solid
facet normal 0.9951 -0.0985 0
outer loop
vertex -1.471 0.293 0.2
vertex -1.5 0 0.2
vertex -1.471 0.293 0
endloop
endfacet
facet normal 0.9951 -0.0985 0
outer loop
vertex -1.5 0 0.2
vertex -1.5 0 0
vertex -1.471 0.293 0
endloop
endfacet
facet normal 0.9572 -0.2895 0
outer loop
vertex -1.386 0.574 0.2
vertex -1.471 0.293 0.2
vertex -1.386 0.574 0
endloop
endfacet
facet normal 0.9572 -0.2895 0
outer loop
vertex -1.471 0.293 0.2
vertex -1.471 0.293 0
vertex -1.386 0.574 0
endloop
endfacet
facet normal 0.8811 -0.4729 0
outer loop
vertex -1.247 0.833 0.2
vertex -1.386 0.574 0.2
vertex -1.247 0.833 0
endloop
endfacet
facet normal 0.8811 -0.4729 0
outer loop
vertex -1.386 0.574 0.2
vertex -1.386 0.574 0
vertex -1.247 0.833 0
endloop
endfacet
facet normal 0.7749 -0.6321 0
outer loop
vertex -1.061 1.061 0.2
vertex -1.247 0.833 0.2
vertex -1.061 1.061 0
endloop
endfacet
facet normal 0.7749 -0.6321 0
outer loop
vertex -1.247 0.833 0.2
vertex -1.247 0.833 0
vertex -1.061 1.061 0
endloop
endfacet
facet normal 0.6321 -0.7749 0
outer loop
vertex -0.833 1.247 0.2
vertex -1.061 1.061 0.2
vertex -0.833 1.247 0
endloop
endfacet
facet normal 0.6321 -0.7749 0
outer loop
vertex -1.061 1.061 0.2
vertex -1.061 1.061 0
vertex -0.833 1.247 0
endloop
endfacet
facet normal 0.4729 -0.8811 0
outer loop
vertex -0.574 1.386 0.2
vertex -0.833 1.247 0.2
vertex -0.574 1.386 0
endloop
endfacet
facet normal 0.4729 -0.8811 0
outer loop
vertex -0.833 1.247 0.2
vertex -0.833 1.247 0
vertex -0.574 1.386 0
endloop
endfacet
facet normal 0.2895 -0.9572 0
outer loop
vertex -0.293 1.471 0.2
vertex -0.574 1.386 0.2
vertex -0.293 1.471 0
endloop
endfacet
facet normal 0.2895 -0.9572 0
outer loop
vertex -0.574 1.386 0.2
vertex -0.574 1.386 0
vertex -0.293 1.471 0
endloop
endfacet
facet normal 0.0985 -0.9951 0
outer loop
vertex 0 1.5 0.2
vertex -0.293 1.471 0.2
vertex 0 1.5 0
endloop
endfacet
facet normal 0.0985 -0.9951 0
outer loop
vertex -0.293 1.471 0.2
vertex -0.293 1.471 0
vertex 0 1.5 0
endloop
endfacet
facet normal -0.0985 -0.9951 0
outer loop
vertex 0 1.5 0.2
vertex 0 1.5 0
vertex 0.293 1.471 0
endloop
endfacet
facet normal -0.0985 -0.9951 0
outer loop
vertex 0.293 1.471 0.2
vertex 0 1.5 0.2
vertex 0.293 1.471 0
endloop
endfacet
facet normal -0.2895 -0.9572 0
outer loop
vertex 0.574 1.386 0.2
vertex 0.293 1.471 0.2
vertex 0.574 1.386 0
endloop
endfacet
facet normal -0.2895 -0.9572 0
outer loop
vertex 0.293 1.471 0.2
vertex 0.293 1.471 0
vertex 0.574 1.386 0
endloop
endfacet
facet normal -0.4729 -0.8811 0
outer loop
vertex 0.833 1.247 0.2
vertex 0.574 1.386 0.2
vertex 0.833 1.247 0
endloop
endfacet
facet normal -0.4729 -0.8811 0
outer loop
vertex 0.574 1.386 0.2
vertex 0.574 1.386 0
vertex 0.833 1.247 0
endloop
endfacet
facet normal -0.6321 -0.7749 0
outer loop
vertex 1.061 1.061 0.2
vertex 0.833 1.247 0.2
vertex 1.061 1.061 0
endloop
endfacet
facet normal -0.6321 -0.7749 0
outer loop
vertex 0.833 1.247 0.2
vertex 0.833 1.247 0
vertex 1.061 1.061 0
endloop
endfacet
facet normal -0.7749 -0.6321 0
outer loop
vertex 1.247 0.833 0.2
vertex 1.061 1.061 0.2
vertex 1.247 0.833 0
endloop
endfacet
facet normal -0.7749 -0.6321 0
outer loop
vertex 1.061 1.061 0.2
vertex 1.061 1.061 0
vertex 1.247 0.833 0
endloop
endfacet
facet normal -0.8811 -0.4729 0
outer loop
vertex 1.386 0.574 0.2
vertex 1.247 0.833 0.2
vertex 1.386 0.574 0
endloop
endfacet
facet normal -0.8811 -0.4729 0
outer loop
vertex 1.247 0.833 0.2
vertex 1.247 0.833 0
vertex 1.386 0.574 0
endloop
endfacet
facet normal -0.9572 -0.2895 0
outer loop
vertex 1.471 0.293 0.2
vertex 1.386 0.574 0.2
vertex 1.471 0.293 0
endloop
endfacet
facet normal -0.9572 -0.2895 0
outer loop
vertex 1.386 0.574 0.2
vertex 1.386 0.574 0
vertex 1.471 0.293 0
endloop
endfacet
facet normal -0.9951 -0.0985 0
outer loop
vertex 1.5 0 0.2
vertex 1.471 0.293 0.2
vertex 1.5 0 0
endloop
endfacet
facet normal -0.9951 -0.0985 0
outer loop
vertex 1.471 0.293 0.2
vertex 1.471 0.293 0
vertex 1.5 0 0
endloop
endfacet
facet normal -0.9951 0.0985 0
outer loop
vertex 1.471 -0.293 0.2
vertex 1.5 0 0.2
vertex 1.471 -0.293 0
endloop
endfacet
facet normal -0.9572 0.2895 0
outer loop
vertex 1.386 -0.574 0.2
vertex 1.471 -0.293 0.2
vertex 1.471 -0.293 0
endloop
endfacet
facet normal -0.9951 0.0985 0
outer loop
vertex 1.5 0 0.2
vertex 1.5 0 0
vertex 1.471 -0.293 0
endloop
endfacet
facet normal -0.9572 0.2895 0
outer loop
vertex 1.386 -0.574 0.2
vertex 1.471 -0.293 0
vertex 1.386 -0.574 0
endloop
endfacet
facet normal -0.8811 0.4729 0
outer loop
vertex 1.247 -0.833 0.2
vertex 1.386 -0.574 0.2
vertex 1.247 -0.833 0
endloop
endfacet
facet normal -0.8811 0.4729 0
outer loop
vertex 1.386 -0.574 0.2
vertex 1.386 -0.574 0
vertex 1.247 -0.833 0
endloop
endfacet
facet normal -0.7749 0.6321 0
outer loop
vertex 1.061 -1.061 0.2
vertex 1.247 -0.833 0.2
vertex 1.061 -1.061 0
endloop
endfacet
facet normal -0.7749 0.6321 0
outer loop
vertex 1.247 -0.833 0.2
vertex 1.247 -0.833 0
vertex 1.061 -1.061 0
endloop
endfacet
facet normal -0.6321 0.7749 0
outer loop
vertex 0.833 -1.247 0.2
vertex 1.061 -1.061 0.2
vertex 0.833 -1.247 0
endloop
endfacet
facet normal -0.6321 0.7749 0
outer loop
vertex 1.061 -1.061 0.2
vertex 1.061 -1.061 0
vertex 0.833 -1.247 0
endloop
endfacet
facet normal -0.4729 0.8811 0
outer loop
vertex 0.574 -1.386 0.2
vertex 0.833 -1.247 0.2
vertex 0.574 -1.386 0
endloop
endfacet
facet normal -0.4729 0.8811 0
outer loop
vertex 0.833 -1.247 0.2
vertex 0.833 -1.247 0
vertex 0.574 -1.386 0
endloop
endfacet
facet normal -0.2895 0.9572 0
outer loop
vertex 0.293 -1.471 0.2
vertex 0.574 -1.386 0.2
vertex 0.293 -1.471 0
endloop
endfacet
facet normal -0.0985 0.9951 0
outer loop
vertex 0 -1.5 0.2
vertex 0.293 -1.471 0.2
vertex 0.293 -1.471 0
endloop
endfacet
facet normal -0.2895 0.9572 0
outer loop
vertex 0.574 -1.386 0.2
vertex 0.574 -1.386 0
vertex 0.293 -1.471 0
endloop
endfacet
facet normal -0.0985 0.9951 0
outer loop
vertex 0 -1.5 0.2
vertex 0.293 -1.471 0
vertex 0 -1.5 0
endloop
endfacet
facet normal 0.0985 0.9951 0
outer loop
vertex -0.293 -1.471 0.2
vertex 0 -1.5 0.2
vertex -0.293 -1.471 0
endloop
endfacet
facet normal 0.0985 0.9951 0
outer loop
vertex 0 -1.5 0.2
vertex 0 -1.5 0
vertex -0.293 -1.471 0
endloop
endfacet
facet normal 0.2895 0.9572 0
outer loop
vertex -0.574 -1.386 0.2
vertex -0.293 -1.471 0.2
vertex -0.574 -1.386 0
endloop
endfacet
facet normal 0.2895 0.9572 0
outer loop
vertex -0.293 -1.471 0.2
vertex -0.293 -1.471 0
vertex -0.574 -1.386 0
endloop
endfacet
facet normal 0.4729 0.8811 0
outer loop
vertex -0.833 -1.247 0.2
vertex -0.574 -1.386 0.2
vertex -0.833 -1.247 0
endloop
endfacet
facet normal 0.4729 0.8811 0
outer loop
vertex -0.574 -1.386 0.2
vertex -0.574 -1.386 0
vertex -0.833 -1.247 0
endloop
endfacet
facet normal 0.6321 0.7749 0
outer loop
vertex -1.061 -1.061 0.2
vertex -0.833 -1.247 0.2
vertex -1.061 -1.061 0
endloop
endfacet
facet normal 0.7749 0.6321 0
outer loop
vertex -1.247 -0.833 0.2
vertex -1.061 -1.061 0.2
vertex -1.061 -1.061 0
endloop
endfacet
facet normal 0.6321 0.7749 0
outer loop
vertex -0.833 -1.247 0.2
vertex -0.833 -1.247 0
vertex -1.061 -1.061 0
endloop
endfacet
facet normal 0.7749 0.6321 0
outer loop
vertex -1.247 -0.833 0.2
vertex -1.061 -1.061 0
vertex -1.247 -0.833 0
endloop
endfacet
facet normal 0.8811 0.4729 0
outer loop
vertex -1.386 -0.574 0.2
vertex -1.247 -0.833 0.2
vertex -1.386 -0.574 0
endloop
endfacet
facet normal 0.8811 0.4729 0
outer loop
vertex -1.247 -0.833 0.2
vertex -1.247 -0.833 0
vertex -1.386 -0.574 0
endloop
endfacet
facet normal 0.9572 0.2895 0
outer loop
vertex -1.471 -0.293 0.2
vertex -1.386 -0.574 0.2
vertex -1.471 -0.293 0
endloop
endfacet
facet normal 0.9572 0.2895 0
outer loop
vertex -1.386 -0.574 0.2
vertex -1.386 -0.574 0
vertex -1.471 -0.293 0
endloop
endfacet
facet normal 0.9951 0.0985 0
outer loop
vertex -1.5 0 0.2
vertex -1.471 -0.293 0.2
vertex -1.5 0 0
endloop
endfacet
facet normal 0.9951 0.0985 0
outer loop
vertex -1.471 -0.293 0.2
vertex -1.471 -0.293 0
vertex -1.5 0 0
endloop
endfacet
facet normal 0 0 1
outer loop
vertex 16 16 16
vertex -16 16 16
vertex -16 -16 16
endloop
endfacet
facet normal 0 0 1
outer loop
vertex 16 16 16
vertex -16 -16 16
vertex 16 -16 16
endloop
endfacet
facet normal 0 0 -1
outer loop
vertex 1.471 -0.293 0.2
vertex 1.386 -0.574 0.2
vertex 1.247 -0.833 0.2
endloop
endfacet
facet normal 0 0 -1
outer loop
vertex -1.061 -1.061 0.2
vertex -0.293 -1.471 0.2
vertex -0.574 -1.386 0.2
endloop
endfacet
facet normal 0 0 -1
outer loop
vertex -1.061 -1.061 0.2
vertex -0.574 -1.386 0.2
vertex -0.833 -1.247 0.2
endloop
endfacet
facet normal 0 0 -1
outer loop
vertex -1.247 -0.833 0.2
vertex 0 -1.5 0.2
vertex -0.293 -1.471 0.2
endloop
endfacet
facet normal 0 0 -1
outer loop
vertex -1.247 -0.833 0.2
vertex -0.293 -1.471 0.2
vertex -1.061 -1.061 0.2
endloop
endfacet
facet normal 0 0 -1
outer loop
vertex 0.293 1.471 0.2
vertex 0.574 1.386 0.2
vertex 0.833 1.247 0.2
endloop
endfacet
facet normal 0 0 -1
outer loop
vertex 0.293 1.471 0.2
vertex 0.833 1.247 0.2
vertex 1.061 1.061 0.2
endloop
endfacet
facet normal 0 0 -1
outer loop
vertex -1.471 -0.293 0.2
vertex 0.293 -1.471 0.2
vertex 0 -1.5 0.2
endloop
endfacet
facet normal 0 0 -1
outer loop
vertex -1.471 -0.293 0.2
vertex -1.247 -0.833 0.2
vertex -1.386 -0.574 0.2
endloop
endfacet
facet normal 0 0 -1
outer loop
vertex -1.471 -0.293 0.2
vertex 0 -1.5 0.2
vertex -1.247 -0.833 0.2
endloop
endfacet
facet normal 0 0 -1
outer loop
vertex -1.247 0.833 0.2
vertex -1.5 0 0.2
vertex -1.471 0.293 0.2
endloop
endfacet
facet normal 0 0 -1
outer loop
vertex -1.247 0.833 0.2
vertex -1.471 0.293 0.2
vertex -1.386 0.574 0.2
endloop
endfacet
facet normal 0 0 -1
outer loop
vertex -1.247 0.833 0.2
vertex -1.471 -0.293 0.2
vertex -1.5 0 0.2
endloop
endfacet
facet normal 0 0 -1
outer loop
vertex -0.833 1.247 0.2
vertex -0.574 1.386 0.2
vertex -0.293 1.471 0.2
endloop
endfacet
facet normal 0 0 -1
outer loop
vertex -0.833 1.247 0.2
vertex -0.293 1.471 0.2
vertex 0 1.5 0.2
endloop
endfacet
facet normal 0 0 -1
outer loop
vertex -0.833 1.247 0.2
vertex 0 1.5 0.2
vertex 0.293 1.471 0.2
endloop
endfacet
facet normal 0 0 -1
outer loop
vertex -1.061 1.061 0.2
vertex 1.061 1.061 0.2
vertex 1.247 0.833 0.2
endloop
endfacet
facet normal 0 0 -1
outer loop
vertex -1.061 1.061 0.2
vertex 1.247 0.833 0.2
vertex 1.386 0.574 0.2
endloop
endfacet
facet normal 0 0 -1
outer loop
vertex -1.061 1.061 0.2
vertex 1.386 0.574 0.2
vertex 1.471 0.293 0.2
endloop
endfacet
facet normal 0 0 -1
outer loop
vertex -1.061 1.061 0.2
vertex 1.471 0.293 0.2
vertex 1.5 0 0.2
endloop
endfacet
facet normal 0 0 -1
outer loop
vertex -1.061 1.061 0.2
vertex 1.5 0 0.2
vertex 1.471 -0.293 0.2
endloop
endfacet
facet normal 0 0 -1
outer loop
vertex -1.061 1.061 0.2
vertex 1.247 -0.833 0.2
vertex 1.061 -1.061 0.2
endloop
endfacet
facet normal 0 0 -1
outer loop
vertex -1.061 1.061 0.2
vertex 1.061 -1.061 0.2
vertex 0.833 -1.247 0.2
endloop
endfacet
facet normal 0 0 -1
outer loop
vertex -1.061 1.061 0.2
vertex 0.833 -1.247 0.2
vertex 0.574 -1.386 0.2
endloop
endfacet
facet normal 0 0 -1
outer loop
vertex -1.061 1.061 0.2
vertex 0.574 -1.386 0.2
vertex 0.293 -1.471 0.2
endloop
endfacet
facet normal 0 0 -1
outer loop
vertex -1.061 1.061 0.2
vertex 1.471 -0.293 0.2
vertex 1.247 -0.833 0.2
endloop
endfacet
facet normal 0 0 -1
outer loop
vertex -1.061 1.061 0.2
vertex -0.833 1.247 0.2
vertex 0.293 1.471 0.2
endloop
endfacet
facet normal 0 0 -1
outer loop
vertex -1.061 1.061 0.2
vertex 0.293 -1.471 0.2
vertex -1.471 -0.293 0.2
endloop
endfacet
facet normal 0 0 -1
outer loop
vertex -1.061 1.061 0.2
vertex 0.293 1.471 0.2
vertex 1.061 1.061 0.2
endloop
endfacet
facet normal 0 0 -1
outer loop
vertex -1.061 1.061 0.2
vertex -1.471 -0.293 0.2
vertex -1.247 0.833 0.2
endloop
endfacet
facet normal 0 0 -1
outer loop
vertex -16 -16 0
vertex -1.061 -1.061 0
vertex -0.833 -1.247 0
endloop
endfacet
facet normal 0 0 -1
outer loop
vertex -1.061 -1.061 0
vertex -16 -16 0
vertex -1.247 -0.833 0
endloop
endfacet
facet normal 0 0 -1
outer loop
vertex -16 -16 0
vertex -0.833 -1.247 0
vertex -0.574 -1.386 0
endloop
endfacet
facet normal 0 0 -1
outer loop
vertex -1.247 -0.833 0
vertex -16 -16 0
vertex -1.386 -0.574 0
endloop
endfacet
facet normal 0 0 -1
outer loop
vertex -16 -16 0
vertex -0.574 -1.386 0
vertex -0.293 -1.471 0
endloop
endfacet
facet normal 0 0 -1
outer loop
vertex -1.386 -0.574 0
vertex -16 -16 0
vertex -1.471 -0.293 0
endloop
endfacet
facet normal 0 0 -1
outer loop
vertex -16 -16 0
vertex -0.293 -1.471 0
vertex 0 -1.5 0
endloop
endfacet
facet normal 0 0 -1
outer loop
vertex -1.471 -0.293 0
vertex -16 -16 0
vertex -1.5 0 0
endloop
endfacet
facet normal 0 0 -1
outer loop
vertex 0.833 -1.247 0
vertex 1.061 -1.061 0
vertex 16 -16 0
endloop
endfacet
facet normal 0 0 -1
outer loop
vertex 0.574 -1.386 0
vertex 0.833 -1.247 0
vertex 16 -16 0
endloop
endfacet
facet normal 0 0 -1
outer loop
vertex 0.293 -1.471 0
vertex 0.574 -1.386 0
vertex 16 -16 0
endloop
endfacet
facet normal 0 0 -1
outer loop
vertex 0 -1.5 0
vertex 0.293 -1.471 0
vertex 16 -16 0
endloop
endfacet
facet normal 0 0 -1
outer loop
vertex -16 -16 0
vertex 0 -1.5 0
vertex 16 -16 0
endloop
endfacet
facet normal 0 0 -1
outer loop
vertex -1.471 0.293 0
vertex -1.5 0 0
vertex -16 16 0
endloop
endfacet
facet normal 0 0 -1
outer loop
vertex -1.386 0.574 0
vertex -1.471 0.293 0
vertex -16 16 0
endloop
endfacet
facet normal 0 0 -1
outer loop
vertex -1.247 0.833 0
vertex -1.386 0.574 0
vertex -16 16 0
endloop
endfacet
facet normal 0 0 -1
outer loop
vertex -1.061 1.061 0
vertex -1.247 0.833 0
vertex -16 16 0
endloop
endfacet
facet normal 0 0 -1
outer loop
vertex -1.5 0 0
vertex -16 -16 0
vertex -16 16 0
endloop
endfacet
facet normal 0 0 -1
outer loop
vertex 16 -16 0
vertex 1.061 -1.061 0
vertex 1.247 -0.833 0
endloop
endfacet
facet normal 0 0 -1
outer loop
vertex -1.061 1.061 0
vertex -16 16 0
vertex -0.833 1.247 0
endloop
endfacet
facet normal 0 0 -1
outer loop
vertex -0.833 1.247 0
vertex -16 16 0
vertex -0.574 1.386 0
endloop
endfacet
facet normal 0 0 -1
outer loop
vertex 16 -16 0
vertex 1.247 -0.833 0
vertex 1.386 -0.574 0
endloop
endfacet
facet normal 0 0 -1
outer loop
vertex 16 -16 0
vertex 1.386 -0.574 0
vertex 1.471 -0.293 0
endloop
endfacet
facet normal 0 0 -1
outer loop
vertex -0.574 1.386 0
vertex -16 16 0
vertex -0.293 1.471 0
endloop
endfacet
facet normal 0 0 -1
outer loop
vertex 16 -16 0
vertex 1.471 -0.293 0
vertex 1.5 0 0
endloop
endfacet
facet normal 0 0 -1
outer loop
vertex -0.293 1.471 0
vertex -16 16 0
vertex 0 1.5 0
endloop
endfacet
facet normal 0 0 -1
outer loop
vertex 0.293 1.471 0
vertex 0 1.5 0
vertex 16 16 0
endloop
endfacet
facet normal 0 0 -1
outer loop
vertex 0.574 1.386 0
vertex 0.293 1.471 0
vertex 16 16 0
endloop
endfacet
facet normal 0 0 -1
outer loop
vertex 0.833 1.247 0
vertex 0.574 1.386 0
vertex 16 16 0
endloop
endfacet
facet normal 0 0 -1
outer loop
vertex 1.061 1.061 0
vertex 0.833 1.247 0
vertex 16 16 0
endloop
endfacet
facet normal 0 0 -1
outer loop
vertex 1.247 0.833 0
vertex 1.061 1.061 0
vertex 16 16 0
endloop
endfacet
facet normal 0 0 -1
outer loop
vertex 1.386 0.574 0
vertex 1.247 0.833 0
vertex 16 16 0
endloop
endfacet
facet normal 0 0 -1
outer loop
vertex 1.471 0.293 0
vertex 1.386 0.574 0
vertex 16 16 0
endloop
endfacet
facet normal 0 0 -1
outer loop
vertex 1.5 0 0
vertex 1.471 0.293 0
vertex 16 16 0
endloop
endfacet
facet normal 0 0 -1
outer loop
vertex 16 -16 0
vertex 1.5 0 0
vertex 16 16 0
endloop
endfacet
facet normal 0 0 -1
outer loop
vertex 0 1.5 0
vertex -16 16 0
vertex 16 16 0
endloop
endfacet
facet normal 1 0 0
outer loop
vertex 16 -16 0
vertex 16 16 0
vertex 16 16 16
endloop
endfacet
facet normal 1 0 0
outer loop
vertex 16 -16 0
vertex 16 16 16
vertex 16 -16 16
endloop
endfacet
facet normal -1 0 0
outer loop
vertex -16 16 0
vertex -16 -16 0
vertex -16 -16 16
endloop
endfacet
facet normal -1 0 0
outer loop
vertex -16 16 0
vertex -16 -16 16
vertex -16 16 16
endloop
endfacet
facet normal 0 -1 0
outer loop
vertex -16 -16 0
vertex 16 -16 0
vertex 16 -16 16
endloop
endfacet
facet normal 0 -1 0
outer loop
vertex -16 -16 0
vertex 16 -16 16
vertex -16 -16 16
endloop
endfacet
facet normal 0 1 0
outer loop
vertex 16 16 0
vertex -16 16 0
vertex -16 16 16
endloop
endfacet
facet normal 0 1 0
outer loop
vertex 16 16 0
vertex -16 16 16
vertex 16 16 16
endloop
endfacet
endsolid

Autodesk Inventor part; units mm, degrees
ref_plane "YZ Plane" through (0, 0, 0) normal (1, 0, 0) x (0, 1, 0)
ref_plane "XZ Plane" through (0, 0, 0) normal (0, 1, 0) x (-1, 0, 0)
ref_plane "XY Plane" through (0, 0, 0) normal (0, 0, 1) x (1, 0, 0)
sketch "Sketch1" plane through (0, 0, 0) normal (0, 0, 1) x (1, 0, 0)
  line L0 (-16, 16) -> (16, 16)
  line L1 (16, 16) -> (16, -16)
  line L2 (16, -16) -> (-16, -16)
  line L3 (-16, -16) -> (-16, 16)
  line L4 (0, 0) -> (0, 16) construction
  line L5 (0, 0) -> (16, 0) construction
  dimension "d0" = 32
extrude "Extrusion1" add sketch "Sketch1" along normal blind 16
sketch "Sketch2" plane through (0, 0, 0) normal (0, 0, -1) x (-1, 0, 0)
  circle A0 centre (0, 0) radius 1.5
  dimension "d3" = 3
extrude "Extrusion2" cut sketch "Sketch2" against normal blind 0.2
properties part number "mould_casing"
